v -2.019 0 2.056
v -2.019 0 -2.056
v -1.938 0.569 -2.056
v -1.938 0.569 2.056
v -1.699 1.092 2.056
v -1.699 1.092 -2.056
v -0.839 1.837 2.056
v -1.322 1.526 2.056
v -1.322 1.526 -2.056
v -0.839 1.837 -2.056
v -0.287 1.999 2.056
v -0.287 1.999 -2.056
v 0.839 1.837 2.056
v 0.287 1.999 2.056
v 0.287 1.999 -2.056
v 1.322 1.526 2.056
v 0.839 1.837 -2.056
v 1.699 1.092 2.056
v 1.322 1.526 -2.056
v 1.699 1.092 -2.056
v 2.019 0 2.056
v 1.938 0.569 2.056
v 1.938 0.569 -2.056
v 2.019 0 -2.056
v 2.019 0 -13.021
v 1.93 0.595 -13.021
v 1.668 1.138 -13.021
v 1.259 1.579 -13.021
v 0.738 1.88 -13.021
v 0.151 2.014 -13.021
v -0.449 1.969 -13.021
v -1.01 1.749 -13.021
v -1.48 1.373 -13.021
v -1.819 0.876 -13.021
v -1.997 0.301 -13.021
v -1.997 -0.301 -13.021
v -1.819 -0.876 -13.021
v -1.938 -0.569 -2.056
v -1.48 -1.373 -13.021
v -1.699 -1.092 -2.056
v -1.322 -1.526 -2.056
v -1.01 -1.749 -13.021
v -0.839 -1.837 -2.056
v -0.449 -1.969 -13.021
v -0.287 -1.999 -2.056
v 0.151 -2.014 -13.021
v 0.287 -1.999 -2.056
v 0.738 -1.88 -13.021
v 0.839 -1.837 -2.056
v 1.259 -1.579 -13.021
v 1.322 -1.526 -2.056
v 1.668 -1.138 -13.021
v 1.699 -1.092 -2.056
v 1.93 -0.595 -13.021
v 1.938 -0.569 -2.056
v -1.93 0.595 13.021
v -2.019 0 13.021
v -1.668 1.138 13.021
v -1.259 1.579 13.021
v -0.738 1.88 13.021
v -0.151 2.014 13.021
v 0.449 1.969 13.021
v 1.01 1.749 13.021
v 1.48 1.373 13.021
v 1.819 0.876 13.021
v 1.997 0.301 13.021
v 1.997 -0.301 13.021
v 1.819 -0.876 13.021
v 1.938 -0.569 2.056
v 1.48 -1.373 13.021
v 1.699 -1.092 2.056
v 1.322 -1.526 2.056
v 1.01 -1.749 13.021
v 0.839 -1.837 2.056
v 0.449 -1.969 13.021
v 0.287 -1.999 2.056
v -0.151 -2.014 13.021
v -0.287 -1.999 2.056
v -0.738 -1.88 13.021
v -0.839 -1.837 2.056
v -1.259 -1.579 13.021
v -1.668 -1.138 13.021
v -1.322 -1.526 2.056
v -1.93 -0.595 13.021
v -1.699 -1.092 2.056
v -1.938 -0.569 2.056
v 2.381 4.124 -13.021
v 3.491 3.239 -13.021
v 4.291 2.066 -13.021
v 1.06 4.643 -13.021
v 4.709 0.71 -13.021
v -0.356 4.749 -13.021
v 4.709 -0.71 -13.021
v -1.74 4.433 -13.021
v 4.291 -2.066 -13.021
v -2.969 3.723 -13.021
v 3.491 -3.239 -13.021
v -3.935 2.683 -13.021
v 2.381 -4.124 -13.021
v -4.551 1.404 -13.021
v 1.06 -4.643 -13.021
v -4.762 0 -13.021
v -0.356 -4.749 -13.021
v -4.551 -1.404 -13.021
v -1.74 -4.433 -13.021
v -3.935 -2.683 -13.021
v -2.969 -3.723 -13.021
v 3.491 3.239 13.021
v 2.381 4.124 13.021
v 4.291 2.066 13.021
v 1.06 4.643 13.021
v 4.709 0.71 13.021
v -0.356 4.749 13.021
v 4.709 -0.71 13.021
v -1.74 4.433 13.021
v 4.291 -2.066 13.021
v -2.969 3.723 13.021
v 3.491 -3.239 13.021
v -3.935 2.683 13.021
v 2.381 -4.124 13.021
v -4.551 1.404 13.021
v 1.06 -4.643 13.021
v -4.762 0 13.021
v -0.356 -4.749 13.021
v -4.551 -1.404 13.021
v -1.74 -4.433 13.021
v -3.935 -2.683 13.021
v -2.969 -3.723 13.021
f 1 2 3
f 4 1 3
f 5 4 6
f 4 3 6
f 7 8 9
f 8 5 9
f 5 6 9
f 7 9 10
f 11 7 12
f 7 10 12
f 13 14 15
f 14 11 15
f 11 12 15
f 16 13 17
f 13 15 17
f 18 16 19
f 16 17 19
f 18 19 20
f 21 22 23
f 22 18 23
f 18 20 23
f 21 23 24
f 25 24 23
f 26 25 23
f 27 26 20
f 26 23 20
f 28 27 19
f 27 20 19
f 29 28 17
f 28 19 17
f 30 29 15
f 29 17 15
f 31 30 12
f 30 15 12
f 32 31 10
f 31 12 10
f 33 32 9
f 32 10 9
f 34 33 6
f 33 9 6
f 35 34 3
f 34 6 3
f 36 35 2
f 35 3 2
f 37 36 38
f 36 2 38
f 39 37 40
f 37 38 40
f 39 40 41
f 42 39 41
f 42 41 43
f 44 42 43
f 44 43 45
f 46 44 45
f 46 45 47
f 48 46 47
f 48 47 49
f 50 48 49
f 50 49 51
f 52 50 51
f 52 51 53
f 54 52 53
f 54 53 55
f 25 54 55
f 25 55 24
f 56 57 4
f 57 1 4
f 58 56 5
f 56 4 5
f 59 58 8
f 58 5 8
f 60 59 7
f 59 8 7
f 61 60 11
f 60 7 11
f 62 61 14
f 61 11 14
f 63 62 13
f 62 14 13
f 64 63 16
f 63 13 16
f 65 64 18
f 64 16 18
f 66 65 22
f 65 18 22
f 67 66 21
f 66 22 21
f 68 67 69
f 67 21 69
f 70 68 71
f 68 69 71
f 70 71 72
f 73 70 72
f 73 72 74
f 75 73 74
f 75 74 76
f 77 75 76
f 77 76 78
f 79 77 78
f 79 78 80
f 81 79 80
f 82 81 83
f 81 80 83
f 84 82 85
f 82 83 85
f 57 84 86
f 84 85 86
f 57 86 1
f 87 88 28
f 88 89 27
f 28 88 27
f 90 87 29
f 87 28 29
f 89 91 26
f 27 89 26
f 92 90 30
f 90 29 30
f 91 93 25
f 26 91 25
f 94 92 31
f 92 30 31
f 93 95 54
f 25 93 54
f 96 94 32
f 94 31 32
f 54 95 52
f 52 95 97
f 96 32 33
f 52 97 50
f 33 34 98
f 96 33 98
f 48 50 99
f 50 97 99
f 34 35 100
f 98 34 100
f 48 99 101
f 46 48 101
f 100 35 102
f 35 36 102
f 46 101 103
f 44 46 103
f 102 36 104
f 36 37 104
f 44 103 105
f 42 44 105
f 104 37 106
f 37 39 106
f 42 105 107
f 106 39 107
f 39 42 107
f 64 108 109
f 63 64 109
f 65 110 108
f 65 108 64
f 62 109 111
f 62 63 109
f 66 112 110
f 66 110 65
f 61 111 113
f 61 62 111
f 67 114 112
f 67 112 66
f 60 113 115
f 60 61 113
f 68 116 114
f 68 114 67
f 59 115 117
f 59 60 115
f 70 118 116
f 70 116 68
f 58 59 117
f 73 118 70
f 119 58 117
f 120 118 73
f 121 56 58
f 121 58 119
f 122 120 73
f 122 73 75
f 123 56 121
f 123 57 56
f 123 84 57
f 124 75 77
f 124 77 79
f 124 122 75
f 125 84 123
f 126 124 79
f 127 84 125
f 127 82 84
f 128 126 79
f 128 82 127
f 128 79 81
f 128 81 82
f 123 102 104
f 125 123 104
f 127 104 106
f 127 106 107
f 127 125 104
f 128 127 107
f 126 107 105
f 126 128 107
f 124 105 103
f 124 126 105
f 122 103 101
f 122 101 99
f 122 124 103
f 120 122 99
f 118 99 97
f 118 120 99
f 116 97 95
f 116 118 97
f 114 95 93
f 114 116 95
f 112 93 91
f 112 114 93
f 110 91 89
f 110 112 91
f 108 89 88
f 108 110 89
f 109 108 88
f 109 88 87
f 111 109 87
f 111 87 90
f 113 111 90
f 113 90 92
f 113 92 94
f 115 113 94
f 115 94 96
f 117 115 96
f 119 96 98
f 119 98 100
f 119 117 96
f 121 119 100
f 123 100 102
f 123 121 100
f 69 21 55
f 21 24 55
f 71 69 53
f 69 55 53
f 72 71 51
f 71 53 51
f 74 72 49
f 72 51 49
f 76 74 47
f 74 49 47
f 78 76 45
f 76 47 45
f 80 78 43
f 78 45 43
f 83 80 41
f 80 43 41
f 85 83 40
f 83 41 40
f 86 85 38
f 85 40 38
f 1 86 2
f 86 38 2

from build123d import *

# Parameters (mm, degrees)
SKETCH1_R                            = 4.7625
BOSS_EXTRUDE1_DEPTH                  = 13.02131
F_10_32_TAPPED_HOLE2_D               = 4.0386
F_10_32_TAPPED_HOLE2_DEPTH           = 15.07744
F_10_32_TAPPED_HOLE2_TIP             = 1.213317848
F_10_32_TAPPED_HOLE2_ON_FACE_2_D     = 4.0386
F_10_32_TAPPED_HOLE2_ON_FACE_2_DEPTH = 15.07744
F_10_32_TAPPED_HOLE2_ON_FACE_2_TIP   = 1.213317848


with BuildPart() as part:
    # Sketch1 → Boss-Extrude1 (new, symmetric)
    with BuildSketch(Plane.XY):
        with Locations(Location((0, 0, 0), (0, 0, 180))):
            Circle(SKETCH1_R)
    extrude(amount=BOSS_EXTRUDE1_DEPTH, both=True)

    # #10-32 Tapped Hole2
    with Locations(Plane.XY.offset(13.02131)):
        with Locations((0, 0)):
            Hole(F_10_32_TAPPED_HOLE2_D / 2, depth=F_10_32_TAPPED_HOLE2_DEPTH)
            with Locations((0, 0, -(F_10_32_TAPPED_HOLE2_DEPTH + F_10_32_TAPPED_HOLE2_TIP / 2))):  # 118° drill point
                Cone(0, F_10_32_TAPPED_HOLE2_D / 2, F_10_32_TAPPED_HOLE2_TIP, mode=Mode.SUBTRACT)

    # #10-32 Tapped Hole2 on face 2
    with Locations(Plane(origin=(0, 0, -13.02131), x_dir=(-1, 0, 0), z_dir=(0, 0, -1))):
        with Locations((0, 0)):
            Hole(F_10_32_TAPPED_HOLE2_ON_FACE_2_D / 2, depth=F_10_32_TAPPED_HOLE2_ON_FACE_2_DEPTH)
            with Locations((0, 0, -(F_10_32_TAPPED_HOLE2_ON_FACE_2_DEPTH + F_10_32_TAPPED_HOLE2_ON_FACE_2_TIP / 2))):  # 118° drill point
                Cone(0, F_10_32_TAPPED_HOLE2_ON_FACE_2_D / 2, F_10_32_TAPPED_HOLE2_ON_FACE_2_TIP, mode=Mode.SUBTRACT)


solid = part.part
